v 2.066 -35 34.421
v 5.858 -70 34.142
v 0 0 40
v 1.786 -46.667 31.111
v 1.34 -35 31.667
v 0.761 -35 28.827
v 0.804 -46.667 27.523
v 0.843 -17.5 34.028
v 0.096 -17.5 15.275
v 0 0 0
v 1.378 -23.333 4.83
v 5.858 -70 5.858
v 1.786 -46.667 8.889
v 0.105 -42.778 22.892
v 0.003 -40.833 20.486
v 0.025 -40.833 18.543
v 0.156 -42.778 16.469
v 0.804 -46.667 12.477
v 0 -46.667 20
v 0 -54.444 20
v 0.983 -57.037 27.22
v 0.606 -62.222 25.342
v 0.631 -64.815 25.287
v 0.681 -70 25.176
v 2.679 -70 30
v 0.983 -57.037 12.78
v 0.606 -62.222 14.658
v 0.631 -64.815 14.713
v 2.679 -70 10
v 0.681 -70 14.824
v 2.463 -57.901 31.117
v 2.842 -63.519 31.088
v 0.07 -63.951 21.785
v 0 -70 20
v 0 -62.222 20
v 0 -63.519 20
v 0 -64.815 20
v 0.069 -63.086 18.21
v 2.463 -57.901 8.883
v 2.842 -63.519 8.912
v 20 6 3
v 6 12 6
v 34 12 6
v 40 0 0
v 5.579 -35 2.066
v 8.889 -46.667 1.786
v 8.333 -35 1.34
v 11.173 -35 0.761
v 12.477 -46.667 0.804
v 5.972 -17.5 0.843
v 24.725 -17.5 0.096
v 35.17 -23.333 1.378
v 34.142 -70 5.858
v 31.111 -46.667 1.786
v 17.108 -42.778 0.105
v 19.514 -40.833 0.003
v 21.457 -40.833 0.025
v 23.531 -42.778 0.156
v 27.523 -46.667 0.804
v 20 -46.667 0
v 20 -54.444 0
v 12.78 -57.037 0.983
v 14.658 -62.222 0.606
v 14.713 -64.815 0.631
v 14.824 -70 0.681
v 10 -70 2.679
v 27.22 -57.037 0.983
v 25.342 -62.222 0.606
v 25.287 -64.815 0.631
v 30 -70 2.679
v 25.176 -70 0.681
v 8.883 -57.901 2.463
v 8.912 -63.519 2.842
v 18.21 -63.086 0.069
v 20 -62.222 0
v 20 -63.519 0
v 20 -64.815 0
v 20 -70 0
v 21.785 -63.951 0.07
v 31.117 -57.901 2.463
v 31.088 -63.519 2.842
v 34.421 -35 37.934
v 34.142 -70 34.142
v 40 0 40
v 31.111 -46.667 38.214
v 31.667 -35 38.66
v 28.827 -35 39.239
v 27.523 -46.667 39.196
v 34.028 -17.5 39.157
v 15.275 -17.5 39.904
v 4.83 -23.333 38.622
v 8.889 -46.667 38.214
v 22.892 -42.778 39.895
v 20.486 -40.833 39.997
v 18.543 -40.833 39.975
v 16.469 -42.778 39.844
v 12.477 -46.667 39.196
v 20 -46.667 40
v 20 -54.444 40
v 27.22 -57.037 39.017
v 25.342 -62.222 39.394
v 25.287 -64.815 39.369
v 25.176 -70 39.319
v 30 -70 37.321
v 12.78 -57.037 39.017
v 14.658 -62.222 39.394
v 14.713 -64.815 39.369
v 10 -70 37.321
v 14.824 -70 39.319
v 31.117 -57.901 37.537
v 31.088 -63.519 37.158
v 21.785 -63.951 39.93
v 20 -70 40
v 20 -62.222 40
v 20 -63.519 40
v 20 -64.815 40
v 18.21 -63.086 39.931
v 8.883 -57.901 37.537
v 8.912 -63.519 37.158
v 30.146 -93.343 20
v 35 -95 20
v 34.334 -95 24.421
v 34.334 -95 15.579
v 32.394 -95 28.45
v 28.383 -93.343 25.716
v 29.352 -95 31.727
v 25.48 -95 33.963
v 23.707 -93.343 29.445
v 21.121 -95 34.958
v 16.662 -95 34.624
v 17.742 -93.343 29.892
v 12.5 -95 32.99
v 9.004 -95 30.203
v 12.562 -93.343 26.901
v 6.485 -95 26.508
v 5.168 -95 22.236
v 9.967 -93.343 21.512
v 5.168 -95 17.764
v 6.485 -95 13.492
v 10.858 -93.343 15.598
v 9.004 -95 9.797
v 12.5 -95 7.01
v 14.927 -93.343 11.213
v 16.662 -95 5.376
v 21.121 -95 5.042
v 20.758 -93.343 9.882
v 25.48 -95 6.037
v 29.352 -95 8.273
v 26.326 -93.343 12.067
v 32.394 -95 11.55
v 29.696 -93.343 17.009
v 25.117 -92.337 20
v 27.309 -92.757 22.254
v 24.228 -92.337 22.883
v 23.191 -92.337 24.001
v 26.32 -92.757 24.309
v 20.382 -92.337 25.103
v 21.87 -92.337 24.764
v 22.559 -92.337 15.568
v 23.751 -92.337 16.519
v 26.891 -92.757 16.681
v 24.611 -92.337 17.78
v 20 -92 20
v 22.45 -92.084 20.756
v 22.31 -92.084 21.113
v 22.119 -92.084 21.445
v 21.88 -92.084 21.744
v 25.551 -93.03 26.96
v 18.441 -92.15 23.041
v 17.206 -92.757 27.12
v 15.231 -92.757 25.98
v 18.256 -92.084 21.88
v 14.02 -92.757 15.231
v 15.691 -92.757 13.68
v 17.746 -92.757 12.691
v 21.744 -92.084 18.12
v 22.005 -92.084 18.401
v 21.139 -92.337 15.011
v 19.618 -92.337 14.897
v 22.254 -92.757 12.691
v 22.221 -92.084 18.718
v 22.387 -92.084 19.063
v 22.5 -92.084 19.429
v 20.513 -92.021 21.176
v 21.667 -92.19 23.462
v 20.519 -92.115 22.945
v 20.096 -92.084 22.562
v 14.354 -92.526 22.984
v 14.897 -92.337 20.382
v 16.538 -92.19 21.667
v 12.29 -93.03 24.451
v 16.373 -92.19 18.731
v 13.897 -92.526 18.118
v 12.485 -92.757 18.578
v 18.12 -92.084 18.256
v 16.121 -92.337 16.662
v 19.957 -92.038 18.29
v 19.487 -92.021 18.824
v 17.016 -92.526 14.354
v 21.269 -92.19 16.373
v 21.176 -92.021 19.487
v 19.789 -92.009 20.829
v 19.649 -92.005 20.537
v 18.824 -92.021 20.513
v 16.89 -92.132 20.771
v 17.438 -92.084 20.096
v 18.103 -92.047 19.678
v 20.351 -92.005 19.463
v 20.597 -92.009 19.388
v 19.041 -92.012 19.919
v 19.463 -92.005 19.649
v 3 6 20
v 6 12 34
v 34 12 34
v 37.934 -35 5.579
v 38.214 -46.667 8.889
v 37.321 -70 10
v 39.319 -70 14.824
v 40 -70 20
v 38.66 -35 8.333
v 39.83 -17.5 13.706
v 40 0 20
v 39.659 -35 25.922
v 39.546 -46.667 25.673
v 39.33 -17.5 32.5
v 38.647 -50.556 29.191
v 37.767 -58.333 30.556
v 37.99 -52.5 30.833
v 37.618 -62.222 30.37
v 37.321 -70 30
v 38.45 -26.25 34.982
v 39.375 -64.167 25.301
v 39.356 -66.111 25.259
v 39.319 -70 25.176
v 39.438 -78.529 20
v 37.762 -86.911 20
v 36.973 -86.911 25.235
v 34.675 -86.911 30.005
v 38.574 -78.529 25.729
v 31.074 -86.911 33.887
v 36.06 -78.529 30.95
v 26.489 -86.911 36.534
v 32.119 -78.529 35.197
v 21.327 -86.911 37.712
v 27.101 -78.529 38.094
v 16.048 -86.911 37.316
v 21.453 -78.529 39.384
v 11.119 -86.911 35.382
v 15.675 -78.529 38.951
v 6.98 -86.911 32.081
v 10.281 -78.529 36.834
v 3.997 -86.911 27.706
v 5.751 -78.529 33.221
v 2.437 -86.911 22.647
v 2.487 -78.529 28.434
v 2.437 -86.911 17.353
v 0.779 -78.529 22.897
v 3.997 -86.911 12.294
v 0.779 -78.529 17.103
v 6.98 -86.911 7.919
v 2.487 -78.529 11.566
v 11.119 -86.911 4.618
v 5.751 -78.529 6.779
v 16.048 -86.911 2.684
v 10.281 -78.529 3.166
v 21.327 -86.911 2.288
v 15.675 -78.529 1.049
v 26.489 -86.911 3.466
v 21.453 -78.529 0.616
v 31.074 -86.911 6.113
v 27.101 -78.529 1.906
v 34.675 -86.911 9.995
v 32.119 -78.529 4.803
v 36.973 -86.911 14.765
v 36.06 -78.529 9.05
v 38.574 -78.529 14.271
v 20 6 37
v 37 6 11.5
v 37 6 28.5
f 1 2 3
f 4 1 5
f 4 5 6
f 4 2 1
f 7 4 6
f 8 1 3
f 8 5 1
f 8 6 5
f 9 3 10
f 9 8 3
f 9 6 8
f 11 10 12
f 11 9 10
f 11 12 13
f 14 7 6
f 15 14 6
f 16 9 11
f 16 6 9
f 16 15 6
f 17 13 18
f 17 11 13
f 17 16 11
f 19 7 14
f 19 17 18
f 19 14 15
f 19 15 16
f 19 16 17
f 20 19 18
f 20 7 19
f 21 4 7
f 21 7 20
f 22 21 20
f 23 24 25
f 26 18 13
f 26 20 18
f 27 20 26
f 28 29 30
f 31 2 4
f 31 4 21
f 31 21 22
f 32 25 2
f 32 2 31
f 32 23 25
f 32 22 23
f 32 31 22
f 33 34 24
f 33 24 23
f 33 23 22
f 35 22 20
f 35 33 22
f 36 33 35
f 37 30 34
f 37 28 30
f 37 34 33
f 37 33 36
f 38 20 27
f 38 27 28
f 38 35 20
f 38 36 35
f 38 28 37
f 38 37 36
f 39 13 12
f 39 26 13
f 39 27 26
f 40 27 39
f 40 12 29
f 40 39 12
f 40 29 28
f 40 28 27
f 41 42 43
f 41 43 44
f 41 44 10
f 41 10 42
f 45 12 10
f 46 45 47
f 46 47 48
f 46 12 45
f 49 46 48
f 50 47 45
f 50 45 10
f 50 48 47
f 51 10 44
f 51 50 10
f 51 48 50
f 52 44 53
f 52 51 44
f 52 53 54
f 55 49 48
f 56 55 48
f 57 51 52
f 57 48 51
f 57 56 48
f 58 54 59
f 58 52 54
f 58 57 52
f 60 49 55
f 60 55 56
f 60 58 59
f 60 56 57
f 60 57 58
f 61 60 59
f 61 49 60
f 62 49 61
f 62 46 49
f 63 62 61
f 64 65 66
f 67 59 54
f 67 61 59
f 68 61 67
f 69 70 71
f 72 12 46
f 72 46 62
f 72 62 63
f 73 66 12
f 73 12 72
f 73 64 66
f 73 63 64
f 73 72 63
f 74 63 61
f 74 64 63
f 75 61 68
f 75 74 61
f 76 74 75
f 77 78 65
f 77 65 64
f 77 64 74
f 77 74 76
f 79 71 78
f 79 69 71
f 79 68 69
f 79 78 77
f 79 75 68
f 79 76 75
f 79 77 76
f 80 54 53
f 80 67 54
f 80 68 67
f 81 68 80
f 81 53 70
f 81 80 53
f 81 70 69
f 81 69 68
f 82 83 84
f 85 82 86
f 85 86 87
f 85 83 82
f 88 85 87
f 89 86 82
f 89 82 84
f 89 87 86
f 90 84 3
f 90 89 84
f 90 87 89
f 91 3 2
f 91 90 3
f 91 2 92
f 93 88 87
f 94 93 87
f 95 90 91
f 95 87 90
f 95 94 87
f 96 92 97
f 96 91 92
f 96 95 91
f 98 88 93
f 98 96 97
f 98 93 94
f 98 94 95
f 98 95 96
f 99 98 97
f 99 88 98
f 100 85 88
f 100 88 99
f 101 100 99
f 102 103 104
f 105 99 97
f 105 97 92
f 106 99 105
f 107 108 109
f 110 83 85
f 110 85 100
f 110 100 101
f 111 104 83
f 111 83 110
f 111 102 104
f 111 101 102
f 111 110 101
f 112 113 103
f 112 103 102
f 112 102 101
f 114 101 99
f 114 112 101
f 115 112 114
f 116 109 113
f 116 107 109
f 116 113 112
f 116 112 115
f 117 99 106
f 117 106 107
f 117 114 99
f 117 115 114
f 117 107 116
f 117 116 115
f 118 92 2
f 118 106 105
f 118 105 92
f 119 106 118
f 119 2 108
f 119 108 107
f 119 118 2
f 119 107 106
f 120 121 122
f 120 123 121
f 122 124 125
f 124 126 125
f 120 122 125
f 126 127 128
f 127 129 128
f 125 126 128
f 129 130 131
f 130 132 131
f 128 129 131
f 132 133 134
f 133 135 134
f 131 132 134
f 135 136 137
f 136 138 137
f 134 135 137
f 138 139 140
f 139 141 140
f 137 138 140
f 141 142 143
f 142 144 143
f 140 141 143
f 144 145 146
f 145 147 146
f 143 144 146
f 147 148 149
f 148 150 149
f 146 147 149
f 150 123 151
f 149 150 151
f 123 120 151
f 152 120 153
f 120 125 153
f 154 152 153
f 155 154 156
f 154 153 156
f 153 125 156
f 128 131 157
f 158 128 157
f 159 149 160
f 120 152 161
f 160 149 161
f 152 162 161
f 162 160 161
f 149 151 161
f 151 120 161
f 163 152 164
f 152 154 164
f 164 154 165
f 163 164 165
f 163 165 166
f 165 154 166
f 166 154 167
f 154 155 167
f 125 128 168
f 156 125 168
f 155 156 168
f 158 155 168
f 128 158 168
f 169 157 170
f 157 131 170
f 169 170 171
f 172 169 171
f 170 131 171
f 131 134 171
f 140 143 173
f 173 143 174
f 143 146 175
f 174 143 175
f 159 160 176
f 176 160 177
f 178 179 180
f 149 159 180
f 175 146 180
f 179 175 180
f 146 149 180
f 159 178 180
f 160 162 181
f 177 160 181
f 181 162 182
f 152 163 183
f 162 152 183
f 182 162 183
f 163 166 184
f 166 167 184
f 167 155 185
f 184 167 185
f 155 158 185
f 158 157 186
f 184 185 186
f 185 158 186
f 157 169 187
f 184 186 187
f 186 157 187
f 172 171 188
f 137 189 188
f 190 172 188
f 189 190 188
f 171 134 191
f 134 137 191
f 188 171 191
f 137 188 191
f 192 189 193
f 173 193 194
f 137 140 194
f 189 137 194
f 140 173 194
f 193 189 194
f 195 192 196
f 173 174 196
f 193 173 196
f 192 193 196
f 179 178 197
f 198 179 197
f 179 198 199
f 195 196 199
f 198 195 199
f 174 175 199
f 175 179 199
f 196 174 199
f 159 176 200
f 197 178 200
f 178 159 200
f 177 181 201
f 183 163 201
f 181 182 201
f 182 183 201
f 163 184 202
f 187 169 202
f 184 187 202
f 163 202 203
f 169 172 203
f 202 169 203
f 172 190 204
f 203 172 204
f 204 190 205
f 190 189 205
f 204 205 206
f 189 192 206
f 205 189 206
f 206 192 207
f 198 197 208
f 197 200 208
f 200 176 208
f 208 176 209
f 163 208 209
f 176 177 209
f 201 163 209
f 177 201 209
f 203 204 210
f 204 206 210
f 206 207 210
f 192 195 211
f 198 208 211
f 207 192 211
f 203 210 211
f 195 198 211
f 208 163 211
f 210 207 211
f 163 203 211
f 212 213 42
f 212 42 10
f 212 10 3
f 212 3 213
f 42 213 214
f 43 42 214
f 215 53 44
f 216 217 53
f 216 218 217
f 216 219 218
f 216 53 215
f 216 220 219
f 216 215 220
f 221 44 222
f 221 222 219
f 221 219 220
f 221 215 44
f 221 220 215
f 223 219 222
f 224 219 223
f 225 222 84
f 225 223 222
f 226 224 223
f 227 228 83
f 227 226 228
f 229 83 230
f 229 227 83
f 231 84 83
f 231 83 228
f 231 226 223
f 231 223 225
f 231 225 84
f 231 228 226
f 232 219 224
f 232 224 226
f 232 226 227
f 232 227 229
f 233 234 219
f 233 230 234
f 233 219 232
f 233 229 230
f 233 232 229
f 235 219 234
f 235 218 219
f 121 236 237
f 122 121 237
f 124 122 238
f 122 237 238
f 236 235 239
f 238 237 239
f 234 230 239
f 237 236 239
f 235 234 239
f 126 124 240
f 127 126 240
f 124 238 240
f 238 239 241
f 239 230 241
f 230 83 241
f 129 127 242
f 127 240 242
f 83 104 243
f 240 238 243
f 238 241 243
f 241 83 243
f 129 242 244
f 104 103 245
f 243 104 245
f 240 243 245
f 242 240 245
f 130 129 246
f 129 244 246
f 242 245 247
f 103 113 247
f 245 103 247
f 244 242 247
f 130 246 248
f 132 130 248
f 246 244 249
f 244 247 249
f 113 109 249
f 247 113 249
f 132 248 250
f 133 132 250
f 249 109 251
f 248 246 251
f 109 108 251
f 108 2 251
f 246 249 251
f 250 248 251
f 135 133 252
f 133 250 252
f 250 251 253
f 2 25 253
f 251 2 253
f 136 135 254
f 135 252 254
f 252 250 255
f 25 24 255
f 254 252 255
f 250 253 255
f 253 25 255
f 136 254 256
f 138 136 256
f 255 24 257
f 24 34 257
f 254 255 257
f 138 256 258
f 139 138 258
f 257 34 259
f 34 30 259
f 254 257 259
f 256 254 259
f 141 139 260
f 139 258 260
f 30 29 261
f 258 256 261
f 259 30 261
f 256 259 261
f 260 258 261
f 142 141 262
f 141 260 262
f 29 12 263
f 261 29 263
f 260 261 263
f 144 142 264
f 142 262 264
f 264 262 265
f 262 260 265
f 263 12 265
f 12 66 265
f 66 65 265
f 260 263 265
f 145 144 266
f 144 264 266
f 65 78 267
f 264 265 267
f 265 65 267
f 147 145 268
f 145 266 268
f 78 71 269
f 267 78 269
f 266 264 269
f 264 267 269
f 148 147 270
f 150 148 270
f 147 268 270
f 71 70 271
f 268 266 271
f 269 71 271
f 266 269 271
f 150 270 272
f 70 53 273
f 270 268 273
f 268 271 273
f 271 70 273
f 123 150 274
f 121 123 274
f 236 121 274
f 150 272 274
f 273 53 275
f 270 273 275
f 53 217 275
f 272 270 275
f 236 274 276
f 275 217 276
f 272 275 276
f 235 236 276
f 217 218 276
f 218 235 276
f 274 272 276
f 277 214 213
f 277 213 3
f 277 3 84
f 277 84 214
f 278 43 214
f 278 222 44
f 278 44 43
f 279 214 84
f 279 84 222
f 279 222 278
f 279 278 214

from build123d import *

# Parameters (mm, degrees)
F0_W = 40
F0_H = 40
F2_R = 20
F5_W = 28
F5_H = 28


with BuildPart() as f3:
    # F0 (on Front) → F3 section 0
    with BuildSketch(Plane.XZ):
        with Locations((20, 20)):
            Rectangle(F0_W, F0_H)
    # F2 (on offset) → F3 section 1
    with BuildSketch(Plane.XZ.offset(70)):
        with Locations((20, 20)):
            Circle(F2_R)
    loft()

    # F5 (on offset) → F6 section 0
    with BuildSketch(Plane.XZ.offset(-12)):
        with Locations((20, 20)):
            Rectangle(F5_W, F5_H)
    # F3_face (on face) → F6 section 1
    with BuildSketch(Plane(origin=(20, 0, 20), x_dir=(-1, 0, 0), z_dir=(0, 1, 0))):
        Polygon((20, -20), (20, 20), (-20, 20), (-20, 0), (-20, -20), align=None)
    loft()

    # F8 (on offset) → F9 (revolve)
    with BuildSketch(Plane.XY.offset(20)):
        with BuildLine():
            Line((40, -70), (20, -70))
            Line((20, -70), (20, -92))
            ThreePointArc((20, -92), (27.648529, -92.757354), (35, -95))
            ThreePointArc((35, -95), (38.737744, -82.747549), (40, -70))
        make_face()
    revolve(axis=Axis((20, -93.5, 20), (0, -1, 0)))


solid = f3.part
